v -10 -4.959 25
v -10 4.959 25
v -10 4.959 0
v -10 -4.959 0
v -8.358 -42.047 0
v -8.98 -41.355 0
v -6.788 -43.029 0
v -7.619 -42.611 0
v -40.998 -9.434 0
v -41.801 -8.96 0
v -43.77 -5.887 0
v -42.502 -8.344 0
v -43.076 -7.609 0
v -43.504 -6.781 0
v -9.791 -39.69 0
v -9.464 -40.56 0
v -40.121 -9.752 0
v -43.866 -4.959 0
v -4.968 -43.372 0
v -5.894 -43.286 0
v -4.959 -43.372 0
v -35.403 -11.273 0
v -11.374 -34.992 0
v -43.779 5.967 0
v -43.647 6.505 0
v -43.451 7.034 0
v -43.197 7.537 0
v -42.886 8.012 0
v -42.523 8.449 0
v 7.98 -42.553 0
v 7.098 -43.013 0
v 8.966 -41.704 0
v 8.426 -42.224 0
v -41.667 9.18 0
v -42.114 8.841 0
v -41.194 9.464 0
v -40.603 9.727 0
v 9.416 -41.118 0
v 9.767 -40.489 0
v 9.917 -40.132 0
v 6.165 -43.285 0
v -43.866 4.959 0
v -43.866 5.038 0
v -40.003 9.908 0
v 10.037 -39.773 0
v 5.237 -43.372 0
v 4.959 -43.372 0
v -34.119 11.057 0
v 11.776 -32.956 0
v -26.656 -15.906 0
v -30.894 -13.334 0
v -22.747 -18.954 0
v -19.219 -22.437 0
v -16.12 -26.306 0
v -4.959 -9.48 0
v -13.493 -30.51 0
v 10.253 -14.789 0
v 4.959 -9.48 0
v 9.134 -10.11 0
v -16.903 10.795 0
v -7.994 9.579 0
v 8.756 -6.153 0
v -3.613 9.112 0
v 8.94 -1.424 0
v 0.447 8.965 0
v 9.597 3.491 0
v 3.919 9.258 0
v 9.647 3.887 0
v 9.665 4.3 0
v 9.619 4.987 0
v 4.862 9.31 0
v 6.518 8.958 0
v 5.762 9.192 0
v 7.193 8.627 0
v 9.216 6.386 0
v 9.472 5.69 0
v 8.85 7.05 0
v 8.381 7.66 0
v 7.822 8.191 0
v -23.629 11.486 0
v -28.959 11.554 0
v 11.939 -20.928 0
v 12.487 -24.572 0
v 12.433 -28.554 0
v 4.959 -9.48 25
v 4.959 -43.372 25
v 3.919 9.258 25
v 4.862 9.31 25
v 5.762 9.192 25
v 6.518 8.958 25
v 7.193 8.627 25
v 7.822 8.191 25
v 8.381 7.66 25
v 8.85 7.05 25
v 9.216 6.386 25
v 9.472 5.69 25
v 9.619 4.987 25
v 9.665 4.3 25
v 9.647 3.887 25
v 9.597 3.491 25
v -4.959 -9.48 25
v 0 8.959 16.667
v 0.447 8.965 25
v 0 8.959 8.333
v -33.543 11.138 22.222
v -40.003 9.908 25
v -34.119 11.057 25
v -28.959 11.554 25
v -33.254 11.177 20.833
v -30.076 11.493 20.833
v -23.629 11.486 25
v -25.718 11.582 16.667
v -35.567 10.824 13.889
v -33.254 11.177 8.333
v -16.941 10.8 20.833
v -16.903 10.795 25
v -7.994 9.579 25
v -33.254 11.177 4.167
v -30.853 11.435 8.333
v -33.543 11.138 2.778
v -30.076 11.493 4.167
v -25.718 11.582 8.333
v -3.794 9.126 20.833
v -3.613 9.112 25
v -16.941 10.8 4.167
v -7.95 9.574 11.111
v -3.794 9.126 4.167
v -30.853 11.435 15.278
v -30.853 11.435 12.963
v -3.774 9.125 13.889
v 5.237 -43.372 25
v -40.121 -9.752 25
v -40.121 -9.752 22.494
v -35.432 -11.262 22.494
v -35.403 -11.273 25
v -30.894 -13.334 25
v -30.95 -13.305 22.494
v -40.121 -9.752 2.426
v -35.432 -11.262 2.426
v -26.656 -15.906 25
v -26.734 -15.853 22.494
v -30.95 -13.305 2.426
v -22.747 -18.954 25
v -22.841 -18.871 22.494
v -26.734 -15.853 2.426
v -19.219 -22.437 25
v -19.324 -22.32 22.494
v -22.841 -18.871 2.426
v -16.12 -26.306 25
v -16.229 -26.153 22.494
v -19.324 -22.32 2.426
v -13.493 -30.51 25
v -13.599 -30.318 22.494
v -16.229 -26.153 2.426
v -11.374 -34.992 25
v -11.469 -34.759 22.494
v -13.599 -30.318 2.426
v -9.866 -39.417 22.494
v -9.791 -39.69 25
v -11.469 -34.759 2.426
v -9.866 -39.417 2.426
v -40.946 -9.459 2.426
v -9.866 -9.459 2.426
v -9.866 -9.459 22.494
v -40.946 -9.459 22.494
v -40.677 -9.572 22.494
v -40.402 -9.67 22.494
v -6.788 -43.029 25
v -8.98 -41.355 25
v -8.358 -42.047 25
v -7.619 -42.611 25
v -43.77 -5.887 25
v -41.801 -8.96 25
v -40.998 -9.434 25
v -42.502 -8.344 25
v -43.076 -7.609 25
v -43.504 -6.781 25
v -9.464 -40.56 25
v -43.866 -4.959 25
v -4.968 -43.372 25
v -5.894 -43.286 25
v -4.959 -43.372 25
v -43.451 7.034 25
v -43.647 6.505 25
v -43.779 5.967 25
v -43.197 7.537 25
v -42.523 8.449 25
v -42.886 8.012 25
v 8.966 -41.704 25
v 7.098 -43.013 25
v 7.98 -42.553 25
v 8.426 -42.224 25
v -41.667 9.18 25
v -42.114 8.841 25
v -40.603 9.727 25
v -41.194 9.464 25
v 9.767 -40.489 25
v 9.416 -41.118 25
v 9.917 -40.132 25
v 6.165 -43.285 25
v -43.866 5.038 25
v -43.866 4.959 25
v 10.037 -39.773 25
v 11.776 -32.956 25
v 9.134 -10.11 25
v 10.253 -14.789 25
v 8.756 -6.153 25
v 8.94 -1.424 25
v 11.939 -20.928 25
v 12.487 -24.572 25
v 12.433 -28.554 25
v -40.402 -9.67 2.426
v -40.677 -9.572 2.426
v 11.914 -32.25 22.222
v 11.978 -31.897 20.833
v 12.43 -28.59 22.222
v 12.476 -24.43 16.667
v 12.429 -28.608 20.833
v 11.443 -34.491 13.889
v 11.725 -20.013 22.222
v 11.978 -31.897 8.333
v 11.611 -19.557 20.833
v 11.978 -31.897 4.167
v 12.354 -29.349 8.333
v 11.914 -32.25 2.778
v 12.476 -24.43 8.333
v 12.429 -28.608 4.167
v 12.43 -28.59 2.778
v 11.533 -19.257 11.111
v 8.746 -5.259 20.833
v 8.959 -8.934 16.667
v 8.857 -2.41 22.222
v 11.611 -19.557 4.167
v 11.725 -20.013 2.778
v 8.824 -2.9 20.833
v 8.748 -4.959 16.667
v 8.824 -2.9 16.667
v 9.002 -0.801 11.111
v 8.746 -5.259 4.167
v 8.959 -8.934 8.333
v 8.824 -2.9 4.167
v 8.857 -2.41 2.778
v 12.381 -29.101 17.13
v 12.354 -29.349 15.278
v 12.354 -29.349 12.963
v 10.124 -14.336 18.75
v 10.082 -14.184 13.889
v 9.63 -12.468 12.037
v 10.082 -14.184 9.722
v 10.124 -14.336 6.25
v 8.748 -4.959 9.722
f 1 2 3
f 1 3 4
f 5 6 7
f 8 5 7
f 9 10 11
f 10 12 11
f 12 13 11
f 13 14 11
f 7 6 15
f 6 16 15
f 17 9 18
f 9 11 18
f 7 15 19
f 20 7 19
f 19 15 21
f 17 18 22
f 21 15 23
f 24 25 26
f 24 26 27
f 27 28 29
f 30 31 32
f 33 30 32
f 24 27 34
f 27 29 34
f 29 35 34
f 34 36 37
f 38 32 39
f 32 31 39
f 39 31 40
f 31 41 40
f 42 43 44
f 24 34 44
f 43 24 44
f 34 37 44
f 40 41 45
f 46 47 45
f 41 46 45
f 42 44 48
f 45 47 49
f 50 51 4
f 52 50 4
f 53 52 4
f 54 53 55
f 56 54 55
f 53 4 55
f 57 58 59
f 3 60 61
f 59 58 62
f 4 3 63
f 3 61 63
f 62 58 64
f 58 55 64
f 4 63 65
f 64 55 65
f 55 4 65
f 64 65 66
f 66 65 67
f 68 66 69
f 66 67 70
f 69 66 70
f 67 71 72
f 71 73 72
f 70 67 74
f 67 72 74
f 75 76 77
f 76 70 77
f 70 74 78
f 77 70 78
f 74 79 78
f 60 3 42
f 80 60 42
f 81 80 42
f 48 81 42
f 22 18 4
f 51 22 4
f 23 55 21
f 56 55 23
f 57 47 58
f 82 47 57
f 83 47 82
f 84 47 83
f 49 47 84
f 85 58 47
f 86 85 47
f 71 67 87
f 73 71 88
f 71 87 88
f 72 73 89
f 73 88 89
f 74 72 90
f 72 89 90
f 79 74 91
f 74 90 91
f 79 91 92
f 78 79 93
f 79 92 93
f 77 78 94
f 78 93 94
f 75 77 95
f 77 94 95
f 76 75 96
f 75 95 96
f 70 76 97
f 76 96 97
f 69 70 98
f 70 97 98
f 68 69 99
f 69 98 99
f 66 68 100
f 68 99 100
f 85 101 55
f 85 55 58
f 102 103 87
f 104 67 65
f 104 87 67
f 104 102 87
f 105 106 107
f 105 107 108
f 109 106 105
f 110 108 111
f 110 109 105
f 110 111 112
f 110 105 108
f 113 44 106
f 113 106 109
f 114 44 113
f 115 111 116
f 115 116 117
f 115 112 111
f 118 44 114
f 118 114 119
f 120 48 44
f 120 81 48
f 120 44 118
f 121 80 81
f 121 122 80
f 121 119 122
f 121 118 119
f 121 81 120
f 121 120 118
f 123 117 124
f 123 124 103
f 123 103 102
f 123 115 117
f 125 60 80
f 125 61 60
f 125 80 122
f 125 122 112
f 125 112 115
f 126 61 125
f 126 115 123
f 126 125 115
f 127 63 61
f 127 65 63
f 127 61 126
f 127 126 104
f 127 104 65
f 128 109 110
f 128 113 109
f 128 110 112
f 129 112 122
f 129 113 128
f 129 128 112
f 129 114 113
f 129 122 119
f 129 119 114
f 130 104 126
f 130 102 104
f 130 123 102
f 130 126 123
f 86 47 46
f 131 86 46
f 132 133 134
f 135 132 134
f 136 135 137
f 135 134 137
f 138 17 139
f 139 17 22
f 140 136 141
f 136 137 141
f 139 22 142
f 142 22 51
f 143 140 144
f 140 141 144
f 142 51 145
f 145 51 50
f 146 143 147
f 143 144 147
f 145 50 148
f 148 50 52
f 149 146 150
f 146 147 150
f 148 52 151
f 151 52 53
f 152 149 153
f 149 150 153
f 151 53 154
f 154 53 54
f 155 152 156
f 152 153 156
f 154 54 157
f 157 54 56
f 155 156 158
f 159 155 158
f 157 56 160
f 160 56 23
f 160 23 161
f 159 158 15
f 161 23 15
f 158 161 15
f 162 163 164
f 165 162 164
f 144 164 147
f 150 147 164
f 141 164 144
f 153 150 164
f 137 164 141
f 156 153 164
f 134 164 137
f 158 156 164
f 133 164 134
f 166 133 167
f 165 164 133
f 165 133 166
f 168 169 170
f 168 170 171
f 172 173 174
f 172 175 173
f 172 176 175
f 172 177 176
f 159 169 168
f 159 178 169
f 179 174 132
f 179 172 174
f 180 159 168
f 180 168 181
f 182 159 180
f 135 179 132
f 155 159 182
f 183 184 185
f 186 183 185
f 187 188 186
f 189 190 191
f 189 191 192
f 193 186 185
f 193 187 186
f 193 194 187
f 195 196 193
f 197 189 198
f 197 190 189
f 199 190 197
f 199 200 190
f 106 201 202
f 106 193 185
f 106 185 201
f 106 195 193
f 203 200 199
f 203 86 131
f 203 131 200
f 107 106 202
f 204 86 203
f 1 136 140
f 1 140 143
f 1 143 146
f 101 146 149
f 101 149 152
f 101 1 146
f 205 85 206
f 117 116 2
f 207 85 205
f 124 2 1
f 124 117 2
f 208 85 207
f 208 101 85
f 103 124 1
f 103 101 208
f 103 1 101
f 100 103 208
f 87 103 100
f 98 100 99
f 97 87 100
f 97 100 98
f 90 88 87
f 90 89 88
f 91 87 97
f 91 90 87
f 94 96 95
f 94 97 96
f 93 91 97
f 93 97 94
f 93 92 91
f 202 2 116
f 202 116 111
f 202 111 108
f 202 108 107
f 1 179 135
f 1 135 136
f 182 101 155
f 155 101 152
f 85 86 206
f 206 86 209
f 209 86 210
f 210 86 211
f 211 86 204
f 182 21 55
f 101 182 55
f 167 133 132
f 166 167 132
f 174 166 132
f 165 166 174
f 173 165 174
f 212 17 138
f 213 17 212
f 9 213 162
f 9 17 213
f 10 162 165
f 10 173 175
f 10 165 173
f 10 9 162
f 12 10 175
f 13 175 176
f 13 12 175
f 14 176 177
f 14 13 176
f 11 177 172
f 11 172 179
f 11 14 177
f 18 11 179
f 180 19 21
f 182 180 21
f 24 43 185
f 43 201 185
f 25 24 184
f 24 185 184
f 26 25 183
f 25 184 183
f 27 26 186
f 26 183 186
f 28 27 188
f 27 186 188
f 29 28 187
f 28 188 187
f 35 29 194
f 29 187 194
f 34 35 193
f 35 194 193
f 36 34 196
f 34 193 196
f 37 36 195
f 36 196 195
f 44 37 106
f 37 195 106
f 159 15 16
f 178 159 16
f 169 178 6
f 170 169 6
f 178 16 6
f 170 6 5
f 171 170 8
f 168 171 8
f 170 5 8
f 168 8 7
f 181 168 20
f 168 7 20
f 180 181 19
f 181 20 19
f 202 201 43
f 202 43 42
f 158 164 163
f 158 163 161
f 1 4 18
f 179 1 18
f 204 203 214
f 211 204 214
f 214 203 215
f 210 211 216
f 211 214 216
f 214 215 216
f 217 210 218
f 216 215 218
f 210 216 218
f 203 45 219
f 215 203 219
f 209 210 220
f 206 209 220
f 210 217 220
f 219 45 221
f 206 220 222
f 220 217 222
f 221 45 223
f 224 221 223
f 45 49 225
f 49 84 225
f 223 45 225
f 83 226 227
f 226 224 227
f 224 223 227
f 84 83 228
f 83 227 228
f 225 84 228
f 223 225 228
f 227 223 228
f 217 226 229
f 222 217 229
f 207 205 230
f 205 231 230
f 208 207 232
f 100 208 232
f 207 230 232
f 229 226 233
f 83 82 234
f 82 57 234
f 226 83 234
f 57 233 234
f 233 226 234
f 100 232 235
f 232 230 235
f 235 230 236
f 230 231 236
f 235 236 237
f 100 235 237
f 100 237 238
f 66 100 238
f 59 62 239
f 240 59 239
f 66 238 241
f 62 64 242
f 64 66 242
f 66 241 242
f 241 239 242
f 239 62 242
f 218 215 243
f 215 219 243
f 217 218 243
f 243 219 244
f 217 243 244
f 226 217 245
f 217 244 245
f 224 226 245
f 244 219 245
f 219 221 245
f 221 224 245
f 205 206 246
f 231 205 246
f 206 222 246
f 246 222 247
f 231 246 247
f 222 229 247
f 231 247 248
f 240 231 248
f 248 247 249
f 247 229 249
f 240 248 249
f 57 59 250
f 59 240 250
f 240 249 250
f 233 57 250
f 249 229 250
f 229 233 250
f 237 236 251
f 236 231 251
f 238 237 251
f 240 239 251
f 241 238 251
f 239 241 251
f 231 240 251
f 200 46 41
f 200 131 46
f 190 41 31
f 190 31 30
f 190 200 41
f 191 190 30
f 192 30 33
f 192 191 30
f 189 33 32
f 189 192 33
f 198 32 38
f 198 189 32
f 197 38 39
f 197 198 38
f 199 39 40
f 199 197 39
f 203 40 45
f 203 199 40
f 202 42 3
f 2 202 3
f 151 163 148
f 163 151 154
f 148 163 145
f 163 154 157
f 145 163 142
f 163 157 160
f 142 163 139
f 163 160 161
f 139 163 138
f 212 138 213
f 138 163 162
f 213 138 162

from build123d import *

# Parameters (mm, degrees)
F1_DEPTH    = 25
F2_W        = 30.2227726206
F2_H        = 20.068306243
F3_DEPTH    = 34
F4_T1_DEPTH = 45.2364697276
F5_R        = 5


# Not quite as in the source:
# - a fillet or chamfer that OpenCascade refuses, or shapes differently, is made with other operations: its cross-section is extruded or revolved along the edge and cut away or added


with BuildPart() as f1:
    # F0 (on Top) → F1 (new body)
    with BuildSketch(Plane.XY):
        with BuildLine():
            Line((-4.959, -9.4801727682), (4.959, -9.4801727682))
            Line((4.959, -9.4801727682), (4.959, -43.3722550981))
            Line((4.959, -43.3722550981), (8.959, -43.3722550981))
            add(Edge.make_bspline(
                [(8.959, -43.3722550981), (10.9444993843, -36.8281108572), (14.7331593025, -24.340805557), (6.9032731799, -9.0055840914), (9.6423102918, 4.2067701187), (11.0949236172, 11.2137733098)],
                knots=[0, 0, 0, 0, 0.3408719694, 0.6504398731, 1, 1, 1, 1], degree=3))
            add(Edge.make_bspline(
                [(-43.8664413989, 8.959), (-38.2964370805, 10.3608151634), (-26.1129886059, 13.4270502754), (-0.196589781, 7.3008338793), (7.8789436209, 10.0993137603), (11.0949236172, 11.2137733098)],
                knots=[0, 0, 0, 0, 0.3363503338, 0.7357098355, 1, 1, 1, 1], degree=3))
            Line((-43.8664413989, 8.959), (-43.8664413989, 4.959))
            Line((-43.8664413989, 4.959), (-10, 4.959))
            Line((-10, 4.959), (-10, -4.959))
            Line((-10, -4.959), (-43.8664413989, -4.959))
            Line((-43.8664413989, -4.959), (-43.8664413989, -8.959))
            ThreePointArc((-43.8664413989, -8.959), (-22.3244394728, -19.3298404084), (-9.7910396518, -39.6897536373))
            ThreePointArc((-9.7910396518, -39.6897536373), (-8.0019231601, -42.3463897646), (-4.9677422736, -43.3722550981))
            Line((-4.9677422736, -43.3722550981), (-4.959, -43.3722550981))
            Line((-4.959, -43.3722550981), (-4.959, -9.4801727682))
        make_face()
    extrude(amount=F1_DEPTH)

    # F2 (on face) → F3 (cut)
    with BuildSketch(Plane(origin=(-43.8664413989, 0, 0), x_dir=(0, -1, 0), z_dir=(-1, 0, 0))):
        with Locations((24.5702010579, 12.4597531976)):
            Rectangle(F2_W, F2_H)
    extrude(amount=-F3_DEPTH, mode=Mode.SUBTRACT)

    # F4: fillet of radius 5 on 1 edges, made by hand

    # F4_s2 → F4_t1 (cut)
    with BuildSketch(Plane.XY.offset(-10.1182348638)):
        with BuildLine():
            ThreePointArc((-40.1210831358, -9.7517343717), (-42.8207560477, -7.971672665), (-43.8664413989, -4.9117060545))
            Line((-43.8664413989, -4.9117060545), (-43.8664413989, -8.959))
            ThreePointArc((-43.8664413989, -8.959), (-41.9848306621, -9.3131688624), (-40.1210831358, -9.7517343717))
        make_face()
    extrude(amount=F4_T1_DEPTH, mode=Mode.SUBTRACT)

    # F5
    f5_edges = [f1.edges().sort_by_distance(p)[0] for p in [
        (8.959, -43.372255, 12.5),
        (11.094924, 11.213773, 12.5),
        (-43.866441, 8.959, 12.5),
    ]]
    fillet(f5_edges, radius=F5_R)


solid = f1.part
